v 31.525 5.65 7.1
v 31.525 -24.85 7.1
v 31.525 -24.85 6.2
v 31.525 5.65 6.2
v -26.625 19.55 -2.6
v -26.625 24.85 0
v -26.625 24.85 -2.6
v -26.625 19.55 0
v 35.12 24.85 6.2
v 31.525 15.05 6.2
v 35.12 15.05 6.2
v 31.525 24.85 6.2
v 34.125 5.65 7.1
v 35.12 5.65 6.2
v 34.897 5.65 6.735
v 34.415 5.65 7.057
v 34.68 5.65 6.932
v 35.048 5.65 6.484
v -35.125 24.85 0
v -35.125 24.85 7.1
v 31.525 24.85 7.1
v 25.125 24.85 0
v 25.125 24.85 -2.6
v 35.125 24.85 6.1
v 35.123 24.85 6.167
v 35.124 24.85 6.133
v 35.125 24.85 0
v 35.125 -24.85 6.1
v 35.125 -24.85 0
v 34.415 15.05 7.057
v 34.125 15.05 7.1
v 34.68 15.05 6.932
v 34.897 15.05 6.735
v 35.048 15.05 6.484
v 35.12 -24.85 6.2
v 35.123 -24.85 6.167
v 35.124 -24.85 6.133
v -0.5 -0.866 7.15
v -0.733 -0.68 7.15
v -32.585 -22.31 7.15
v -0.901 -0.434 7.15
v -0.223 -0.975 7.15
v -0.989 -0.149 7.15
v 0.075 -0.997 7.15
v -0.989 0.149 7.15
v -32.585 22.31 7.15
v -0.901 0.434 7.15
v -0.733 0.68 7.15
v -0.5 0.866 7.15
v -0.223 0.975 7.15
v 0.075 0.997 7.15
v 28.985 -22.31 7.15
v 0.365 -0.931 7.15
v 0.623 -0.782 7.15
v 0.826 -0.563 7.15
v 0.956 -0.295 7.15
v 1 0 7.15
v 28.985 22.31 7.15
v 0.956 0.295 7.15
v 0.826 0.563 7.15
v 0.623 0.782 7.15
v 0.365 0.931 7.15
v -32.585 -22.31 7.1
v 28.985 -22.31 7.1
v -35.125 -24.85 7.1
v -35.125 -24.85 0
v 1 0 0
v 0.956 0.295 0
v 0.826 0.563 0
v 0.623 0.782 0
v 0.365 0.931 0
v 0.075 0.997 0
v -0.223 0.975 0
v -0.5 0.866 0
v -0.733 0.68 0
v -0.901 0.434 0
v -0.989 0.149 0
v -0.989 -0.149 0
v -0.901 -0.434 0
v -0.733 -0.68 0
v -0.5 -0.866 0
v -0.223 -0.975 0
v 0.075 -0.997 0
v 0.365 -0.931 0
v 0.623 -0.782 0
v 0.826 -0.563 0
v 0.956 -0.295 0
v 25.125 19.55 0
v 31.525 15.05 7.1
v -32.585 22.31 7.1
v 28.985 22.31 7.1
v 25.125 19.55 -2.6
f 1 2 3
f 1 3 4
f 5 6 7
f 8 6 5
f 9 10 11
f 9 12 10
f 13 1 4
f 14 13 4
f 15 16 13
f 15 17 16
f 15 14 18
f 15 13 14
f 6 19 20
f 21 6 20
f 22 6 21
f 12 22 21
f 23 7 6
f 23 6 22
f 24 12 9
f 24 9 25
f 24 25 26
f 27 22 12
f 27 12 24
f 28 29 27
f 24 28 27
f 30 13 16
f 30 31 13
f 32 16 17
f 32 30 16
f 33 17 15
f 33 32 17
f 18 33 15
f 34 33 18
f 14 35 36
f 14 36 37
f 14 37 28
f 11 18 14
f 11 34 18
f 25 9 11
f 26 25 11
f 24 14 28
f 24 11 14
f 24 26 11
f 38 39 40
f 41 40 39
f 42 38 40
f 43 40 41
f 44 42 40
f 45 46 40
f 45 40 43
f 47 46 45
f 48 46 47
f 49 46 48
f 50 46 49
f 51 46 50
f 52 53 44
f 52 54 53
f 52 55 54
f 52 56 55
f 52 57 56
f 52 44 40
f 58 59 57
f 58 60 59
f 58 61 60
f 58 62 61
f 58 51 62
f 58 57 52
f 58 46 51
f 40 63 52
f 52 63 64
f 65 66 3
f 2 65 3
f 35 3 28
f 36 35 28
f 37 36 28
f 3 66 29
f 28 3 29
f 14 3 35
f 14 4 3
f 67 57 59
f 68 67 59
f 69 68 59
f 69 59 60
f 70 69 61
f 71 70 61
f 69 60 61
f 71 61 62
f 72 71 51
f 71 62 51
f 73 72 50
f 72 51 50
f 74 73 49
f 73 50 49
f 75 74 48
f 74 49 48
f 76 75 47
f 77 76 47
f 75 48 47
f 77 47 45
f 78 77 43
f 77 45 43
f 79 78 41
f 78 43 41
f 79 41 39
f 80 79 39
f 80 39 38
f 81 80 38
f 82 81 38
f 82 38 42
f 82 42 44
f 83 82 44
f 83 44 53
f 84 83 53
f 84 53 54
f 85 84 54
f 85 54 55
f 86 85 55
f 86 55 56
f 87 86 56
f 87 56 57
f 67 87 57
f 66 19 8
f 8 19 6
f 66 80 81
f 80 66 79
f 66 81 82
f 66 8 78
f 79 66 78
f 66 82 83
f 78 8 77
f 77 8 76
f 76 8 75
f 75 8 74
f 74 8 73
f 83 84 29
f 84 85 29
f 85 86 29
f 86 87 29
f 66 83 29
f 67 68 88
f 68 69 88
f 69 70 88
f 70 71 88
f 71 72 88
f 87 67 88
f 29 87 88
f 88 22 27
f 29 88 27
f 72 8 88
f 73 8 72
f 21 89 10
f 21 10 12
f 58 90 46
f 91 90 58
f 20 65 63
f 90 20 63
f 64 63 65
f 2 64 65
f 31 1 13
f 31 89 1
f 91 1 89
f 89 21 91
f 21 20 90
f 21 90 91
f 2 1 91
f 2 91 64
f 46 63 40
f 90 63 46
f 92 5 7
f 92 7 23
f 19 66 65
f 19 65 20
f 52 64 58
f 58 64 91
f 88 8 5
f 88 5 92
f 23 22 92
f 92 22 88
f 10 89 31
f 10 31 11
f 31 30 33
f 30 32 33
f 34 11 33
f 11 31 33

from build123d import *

# Parameters (mm, degrees)
SKETCH_W        = 70.25
SKETCH_H        = 49.7
PAD_DEPTH       = 7.1
SKETCH001_W     = 3.6
SKETCH001_H     = 9.8
SKETCH001_H_2   = 30.5
POCKET_DEPTH    = 0.9
SKETCH002_W     = 51.75
SKETCH002_H     = 5.3
PAD001_DEPTH    = 2.6
FILLET_R        = 1
SKETCH003_W     = 61.57
SKETCH003_H     = 44.62
PAD002_DEPTH    = 0.05
SKETCH004_R     = 1
POCKET001_DEPTH = 9.751


with BuildPart() as part:
    # Sketch → Pad (new body)
    with BuildSketch(Plane.XY):
        Rectangle(SKETCH_W, SKETCH_H)
    extrude(amount=PAD_DEPTH)

    # Sketch001 (on Face6 of Pad) → Pocket (cut)
    with BuildSketch(Plane.XY.offset(7.1)):
        with Locations((33.325, 19.95)):
            Rectangle(SKETCH001_W, SKETCH001_H)
        with Locations((33.325, -9.6)):
            Rectangle(SKETCH001_W, SKETCH001_H_2)
    extrude(amount=-POCKET_DEPTH, mode=Mode.SUBTRACT)

    # Sketch002 (on Face2 of Pocket) → Pad001 (join)
    with BuildSketch(Plane(origin=(0, 0, 0), x_dir=(1, 0, 0), z_dir=(0, 0, -1))):
        with Locations((-0.75, -22.2)):
            Rectangle(SKETCH002_W, SKETCH002_H)
    extrude(amount=PAD001_DEPTH)

    # Fillet
    fillet_edges = [part.edges().sort_by_distance(p)[0] for p in [
        (35.125, 10.35, 7.1),
    ]]
    fillet(fillet_edges, radius=FILLET_R)

    # Sketch003 (on Face8 of Fillet) → Pad002 (join)
    with BuildSketch(Plane.XY.offset(7.1)):
        with Locations((-1.8, 0)):
            Rectangle(SKETCH003_W, SKETCH003_H)
    extrude(amount=PAD002_DEPTH)

    # Sketch004 (on Face23 of Pad002) → Pocket001 (cut, through all)
    with BuildSketch(Plane.XY.offset(7.15)):
        Circle(SKETCH004_R)
    extrude(amount=-POCKET001_DEPTH, mode=Mode.SUBTRACT)


solid = part.part
